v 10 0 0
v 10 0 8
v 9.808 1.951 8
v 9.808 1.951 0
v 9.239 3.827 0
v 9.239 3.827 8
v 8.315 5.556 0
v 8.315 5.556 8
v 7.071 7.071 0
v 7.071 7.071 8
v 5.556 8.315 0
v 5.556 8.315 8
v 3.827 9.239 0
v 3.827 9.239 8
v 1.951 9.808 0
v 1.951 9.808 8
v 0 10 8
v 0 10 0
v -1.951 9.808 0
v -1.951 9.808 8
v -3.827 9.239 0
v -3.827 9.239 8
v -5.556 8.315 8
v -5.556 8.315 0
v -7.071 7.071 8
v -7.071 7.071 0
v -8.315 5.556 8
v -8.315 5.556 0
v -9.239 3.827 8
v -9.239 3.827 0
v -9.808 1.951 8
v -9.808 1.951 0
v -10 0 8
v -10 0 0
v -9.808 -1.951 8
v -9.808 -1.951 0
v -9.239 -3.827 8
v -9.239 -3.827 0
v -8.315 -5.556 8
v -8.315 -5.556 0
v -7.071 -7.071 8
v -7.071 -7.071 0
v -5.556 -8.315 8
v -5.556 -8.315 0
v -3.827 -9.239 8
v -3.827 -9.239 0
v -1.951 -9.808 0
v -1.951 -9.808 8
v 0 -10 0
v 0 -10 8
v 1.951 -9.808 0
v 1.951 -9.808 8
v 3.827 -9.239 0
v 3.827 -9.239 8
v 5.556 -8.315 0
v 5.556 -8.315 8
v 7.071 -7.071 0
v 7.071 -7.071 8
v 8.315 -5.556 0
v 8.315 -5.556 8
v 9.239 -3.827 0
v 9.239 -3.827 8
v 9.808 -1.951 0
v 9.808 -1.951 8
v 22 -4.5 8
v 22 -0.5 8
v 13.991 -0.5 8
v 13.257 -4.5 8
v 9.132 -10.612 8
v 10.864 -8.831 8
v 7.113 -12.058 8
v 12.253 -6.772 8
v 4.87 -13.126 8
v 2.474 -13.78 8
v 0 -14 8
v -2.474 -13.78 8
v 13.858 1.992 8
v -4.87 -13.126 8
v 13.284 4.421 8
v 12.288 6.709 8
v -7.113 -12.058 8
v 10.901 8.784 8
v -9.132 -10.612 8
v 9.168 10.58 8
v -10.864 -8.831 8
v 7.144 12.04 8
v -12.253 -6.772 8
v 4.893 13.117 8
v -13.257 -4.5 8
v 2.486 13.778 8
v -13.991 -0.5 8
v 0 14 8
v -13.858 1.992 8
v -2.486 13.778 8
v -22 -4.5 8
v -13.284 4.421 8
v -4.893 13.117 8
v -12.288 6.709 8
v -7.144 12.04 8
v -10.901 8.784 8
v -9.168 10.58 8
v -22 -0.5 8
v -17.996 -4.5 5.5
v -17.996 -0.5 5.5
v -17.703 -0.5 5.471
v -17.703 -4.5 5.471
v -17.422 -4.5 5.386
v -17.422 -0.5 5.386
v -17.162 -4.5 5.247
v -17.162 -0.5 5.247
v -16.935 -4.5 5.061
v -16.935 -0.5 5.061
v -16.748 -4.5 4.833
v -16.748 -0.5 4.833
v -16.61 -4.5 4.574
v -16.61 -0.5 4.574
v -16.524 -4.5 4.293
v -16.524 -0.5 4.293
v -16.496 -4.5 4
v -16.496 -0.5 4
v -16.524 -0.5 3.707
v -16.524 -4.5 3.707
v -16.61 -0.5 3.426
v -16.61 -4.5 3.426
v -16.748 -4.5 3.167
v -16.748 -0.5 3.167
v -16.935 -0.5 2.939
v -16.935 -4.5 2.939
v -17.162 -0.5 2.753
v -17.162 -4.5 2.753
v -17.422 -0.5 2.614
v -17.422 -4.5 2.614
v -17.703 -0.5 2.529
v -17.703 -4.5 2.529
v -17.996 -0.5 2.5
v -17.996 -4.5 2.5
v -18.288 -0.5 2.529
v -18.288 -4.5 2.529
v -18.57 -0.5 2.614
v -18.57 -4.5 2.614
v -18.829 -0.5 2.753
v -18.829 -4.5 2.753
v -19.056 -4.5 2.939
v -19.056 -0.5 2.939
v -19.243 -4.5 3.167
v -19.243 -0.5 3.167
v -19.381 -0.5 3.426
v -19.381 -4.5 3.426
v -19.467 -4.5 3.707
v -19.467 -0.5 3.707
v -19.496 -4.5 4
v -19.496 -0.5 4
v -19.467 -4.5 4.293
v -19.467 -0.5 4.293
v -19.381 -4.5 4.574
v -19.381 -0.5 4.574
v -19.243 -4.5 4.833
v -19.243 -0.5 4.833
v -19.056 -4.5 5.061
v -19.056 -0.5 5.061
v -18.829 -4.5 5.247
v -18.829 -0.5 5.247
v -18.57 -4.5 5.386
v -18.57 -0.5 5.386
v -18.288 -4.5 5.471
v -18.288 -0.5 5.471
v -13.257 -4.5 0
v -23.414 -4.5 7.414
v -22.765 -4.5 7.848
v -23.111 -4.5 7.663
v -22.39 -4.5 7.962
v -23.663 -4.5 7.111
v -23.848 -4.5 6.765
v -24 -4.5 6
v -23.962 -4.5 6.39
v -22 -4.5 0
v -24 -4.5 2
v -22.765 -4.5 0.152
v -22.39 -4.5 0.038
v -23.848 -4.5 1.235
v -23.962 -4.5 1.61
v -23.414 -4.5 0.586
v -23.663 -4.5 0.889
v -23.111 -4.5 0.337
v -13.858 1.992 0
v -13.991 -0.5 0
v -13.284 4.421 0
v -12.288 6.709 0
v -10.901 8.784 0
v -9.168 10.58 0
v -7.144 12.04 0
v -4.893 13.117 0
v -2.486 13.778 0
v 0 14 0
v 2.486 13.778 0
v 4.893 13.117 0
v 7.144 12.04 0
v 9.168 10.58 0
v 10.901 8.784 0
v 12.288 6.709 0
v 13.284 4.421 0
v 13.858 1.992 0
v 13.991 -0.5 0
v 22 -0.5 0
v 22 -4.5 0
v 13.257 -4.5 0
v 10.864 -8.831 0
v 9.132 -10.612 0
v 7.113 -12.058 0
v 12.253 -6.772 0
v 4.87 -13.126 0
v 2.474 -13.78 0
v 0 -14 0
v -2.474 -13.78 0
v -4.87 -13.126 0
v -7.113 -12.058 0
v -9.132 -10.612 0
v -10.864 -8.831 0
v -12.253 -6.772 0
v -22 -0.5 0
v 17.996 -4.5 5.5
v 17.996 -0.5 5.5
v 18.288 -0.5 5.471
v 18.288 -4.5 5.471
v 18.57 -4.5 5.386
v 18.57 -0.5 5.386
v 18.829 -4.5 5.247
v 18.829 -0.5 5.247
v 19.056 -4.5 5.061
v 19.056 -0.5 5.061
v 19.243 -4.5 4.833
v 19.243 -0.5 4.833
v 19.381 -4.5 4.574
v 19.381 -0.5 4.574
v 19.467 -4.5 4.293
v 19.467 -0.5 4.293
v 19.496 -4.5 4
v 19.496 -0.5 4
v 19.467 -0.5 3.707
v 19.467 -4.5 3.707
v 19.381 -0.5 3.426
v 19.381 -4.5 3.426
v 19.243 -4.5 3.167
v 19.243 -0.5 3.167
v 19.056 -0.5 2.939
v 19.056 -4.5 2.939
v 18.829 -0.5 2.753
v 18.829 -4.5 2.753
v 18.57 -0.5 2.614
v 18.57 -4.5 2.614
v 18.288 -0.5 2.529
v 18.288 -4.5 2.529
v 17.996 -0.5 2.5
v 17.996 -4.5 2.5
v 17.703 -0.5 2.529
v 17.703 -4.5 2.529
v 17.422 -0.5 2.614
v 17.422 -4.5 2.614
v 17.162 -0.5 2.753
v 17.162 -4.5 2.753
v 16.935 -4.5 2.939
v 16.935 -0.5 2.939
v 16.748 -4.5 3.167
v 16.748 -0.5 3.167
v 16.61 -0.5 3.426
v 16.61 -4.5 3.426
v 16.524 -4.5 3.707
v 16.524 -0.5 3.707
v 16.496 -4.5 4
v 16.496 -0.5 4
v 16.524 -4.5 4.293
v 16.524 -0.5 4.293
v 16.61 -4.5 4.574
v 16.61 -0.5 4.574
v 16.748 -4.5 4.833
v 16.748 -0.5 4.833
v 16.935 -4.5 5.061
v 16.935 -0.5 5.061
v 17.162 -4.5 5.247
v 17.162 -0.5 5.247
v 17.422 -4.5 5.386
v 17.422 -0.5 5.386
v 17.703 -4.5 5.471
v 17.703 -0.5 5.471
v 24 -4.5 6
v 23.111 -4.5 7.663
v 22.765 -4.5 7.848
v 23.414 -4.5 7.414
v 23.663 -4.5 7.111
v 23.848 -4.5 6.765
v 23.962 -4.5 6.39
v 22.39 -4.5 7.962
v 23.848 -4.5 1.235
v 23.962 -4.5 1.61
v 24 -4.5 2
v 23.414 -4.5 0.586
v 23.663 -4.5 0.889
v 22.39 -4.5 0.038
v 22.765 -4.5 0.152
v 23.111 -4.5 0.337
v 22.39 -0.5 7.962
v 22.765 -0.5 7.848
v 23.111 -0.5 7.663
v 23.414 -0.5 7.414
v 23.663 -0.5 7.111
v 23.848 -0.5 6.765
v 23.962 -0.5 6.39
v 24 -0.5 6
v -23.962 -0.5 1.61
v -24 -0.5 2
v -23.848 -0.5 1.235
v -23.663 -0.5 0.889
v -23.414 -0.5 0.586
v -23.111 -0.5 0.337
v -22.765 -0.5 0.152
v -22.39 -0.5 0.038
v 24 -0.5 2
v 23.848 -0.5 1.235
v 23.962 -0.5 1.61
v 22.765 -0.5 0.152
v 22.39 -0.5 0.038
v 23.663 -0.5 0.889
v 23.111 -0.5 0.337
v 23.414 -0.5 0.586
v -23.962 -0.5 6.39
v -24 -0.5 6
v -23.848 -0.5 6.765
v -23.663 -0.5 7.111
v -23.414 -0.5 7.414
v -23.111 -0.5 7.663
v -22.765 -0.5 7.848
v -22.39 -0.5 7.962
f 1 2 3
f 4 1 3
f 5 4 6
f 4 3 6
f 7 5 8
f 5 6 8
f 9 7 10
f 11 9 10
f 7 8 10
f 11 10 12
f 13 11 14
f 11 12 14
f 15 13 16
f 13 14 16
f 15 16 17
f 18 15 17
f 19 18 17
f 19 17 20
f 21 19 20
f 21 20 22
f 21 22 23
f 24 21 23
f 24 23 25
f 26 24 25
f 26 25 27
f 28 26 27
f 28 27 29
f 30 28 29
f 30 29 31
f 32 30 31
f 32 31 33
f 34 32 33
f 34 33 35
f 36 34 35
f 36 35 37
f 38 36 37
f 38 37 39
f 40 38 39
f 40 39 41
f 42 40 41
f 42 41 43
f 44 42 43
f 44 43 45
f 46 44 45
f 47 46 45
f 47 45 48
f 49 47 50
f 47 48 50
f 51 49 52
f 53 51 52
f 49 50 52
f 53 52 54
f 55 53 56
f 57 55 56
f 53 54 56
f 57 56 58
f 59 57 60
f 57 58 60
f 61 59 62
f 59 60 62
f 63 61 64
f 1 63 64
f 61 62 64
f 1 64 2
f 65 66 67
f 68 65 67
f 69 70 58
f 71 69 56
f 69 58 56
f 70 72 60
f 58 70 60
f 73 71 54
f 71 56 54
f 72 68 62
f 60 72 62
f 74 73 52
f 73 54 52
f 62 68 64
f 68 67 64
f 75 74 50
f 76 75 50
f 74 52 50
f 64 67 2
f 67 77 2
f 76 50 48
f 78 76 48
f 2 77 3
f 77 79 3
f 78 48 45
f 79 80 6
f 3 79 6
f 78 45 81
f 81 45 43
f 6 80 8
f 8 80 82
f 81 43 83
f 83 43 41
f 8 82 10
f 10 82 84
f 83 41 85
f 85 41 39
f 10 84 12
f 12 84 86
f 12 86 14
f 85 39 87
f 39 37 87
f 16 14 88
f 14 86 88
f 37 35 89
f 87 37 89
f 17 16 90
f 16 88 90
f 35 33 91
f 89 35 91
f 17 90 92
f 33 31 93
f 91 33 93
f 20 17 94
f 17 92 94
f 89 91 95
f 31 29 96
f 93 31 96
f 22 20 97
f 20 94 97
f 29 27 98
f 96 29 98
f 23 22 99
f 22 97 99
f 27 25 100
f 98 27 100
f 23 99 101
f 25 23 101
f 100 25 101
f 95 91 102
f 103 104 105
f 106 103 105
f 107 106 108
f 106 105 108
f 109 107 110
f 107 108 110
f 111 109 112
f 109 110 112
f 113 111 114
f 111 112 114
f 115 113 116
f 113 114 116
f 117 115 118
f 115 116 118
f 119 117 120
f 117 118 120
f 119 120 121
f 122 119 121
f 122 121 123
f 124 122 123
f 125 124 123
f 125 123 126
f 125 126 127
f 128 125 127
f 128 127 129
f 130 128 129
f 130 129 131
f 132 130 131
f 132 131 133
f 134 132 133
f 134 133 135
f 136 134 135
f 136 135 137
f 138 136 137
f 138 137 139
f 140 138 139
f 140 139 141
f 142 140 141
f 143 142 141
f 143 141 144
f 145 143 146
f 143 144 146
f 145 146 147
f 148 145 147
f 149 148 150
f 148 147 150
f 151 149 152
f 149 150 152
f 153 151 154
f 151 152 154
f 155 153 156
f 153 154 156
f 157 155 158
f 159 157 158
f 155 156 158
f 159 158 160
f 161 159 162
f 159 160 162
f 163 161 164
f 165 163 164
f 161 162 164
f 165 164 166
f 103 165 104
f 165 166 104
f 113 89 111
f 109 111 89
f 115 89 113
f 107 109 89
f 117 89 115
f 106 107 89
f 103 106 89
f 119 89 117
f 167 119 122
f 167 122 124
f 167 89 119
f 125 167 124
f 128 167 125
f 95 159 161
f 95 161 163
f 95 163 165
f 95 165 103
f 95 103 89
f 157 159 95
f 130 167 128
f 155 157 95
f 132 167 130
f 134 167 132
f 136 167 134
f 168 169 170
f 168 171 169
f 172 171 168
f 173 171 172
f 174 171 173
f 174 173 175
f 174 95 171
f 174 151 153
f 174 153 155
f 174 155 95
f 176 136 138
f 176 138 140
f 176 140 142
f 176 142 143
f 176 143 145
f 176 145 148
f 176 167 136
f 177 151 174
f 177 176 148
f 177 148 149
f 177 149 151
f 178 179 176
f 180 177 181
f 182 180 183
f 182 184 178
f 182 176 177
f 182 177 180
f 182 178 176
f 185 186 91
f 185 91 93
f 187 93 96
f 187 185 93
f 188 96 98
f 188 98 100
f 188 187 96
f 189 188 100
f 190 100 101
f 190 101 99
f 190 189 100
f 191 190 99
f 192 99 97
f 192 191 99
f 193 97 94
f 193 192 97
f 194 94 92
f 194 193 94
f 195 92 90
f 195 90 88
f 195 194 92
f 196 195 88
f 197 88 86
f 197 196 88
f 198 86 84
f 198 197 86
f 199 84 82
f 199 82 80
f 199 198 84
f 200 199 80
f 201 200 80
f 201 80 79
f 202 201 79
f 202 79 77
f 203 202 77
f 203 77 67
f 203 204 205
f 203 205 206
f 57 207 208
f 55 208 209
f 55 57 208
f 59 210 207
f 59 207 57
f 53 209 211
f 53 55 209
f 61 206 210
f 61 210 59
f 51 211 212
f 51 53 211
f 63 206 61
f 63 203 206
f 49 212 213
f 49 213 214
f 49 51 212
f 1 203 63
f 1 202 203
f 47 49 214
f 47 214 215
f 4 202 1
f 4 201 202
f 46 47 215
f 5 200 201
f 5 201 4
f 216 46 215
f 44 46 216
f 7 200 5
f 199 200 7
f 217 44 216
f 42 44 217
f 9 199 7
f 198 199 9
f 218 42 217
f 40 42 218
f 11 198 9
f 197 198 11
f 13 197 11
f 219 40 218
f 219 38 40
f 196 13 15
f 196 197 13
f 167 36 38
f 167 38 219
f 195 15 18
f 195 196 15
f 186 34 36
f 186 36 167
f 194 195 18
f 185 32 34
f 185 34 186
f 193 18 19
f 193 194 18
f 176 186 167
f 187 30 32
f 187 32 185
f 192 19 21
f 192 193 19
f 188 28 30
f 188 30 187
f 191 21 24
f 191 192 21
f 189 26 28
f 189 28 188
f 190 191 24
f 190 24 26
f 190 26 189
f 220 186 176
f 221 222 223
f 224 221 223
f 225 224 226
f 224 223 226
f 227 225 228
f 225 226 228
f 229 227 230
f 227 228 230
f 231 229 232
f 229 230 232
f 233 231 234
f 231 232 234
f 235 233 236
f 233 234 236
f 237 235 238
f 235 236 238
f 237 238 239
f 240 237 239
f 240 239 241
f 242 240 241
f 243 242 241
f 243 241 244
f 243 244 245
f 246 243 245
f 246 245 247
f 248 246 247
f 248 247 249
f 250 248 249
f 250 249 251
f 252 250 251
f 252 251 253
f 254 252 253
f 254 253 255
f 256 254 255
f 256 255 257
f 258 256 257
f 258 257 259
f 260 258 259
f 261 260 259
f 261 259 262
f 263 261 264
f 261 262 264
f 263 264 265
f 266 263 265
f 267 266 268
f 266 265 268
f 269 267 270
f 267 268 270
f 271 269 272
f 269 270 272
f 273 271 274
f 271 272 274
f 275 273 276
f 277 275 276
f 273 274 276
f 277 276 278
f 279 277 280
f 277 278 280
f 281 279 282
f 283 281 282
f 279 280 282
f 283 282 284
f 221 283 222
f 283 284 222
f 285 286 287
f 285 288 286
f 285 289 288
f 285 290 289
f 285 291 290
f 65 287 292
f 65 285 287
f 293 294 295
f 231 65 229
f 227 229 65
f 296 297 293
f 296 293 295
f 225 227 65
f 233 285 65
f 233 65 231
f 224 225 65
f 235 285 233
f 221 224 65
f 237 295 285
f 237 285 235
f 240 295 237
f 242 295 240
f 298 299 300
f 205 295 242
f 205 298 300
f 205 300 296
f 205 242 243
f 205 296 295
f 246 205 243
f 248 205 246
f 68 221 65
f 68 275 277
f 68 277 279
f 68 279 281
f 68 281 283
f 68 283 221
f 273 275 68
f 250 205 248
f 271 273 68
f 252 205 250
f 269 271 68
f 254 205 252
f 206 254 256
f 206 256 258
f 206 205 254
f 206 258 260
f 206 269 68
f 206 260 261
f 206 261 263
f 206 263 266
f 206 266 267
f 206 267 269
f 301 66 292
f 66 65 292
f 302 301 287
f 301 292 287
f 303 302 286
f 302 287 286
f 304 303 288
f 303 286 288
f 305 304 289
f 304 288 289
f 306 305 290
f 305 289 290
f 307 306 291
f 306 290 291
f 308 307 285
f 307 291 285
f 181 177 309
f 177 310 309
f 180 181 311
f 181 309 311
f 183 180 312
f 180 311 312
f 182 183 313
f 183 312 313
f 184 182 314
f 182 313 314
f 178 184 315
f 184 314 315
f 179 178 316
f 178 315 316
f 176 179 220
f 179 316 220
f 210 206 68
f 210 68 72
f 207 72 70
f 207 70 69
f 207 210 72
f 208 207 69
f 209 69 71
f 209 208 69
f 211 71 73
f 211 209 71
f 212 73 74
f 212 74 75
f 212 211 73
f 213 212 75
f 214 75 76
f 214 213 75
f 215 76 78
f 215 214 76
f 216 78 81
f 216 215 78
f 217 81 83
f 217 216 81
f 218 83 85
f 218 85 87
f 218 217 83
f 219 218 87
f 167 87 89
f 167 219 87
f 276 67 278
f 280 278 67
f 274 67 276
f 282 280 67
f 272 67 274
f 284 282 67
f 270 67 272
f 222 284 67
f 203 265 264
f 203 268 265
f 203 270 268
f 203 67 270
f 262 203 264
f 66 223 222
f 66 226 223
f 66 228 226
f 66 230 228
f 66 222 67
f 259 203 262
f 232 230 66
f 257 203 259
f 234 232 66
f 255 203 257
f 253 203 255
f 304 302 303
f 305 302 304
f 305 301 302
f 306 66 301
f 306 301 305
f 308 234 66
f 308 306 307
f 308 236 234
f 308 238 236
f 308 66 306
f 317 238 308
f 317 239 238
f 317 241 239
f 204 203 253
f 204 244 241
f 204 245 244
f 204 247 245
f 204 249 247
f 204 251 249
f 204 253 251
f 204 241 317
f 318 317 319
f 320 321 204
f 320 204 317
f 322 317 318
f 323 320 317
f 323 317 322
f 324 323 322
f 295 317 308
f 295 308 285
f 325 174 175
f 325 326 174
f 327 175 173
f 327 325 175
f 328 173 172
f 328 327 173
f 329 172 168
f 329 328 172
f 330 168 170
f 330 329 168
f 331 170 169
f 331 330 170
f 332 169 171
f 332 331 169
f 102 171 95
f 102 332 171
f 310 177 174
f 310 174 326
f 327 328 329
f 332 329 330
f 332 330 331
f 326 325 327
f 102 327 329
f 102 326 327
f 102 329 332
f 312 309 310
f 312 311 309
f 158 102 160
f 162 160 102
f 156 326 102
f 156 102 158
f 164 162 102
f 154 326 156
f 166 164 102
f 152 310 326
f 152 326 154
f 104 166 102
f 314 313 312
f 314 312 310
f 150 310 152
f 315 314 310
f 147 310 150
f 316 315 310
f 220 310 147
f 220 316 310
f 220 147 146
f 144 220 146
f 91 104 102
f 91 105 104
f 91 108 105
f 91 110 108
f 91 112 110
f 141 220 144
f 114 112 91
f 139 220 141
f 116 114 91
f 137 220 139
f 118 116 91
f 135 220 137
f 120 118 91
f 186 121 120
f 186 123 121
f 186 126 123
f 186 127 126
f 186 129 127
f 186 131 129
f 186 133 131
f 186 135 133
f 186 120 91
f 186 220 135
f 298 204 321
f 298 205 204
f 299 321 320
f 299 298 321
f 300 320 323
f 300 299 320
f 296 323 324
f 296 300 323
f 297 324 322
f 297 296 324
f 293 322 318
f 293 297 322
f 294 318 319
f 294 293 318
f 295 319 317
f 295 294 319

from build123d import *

# Parameters (mm, degrees)
SALIENTE_EXTRUIR1_DEPTH = 8
CROQUIS2_R              = 10
CORTAR_EXTRUIR1_DEPTH   = 29.91366459
REDONDEO1_R             = 2
CROQUIS3_R              = 1.5
CORTAR_EXTRUIR2_DEPTH   = 30.159046624


with BuildPart() as part:
    # Croquis1 → Saliente-Extruir1 (new body)
    with BuildSketch(Plane.XY):
        with BuildLine():
            Line((-24, -0.5), (-13.99106858, -0.5))
            ThreePointArc((-13.99106858, -0.5), (0, 14), (13.99106858, -0.5))
            Line((13.99106858, -0.5), (24, -0.5))
            Line((24, -0.5), (24, -4.5))
            Line((24, -4.5), (13.257073584, -4.5))
            ThreePointArc((13.257073584, -4.5), (0, -14), (-13.257073584, -4.5))
            Line((-13.257073584, -4.5), (-24, -4.5))
            Line((-24, -4.5), (-24, -0.5))
        make_face()
    extrude(amount=SALIENTE_EXTRUIR1_DEPTH)

    # Croquis2 → Cortar-Extruir1 (cut, through all)
    with BuildSketch(Plane.XY.offset(8)):
        Circle(CROQUIS2_R)
    extrude(amount=-CORTAR_EXTRUIR1_DEPTH, mode=Mode.SUBTRACT)

    # Redondeo1
    redondeo1_edges = [part.edges().sort_by_distance(p)[0] for p in [
        (24, -2.5, 8),
        (-24, -2.5, 8),
        (-24, -2.5, 0),
        (24, -2.5, 0),
    ]]
    fillet(redondeo1_edges, radius=REDONDEO1_R)

    # Croquis3 → Cortar-Extruir2 (cut, through all)
    with BuildSketch(Plane(origin=(0, -0.5, 0), x_dir=(1, 0, 0), z_dir=(0, 1, 0))):
        with Locations(Location((-17.99553429, -4, 0), (0, 0, 270))):
            Circle(CROQUIS3_R)
        with Locations(Location((17.99553429, -4, 0), (0, 0, 270))):
            Circle(CROQUIS3_R)
    extrude(amount=-CORTAR_EXTRUIR2_DEPTH, mode=Mode.SUBTRACT)


solid = part.part
